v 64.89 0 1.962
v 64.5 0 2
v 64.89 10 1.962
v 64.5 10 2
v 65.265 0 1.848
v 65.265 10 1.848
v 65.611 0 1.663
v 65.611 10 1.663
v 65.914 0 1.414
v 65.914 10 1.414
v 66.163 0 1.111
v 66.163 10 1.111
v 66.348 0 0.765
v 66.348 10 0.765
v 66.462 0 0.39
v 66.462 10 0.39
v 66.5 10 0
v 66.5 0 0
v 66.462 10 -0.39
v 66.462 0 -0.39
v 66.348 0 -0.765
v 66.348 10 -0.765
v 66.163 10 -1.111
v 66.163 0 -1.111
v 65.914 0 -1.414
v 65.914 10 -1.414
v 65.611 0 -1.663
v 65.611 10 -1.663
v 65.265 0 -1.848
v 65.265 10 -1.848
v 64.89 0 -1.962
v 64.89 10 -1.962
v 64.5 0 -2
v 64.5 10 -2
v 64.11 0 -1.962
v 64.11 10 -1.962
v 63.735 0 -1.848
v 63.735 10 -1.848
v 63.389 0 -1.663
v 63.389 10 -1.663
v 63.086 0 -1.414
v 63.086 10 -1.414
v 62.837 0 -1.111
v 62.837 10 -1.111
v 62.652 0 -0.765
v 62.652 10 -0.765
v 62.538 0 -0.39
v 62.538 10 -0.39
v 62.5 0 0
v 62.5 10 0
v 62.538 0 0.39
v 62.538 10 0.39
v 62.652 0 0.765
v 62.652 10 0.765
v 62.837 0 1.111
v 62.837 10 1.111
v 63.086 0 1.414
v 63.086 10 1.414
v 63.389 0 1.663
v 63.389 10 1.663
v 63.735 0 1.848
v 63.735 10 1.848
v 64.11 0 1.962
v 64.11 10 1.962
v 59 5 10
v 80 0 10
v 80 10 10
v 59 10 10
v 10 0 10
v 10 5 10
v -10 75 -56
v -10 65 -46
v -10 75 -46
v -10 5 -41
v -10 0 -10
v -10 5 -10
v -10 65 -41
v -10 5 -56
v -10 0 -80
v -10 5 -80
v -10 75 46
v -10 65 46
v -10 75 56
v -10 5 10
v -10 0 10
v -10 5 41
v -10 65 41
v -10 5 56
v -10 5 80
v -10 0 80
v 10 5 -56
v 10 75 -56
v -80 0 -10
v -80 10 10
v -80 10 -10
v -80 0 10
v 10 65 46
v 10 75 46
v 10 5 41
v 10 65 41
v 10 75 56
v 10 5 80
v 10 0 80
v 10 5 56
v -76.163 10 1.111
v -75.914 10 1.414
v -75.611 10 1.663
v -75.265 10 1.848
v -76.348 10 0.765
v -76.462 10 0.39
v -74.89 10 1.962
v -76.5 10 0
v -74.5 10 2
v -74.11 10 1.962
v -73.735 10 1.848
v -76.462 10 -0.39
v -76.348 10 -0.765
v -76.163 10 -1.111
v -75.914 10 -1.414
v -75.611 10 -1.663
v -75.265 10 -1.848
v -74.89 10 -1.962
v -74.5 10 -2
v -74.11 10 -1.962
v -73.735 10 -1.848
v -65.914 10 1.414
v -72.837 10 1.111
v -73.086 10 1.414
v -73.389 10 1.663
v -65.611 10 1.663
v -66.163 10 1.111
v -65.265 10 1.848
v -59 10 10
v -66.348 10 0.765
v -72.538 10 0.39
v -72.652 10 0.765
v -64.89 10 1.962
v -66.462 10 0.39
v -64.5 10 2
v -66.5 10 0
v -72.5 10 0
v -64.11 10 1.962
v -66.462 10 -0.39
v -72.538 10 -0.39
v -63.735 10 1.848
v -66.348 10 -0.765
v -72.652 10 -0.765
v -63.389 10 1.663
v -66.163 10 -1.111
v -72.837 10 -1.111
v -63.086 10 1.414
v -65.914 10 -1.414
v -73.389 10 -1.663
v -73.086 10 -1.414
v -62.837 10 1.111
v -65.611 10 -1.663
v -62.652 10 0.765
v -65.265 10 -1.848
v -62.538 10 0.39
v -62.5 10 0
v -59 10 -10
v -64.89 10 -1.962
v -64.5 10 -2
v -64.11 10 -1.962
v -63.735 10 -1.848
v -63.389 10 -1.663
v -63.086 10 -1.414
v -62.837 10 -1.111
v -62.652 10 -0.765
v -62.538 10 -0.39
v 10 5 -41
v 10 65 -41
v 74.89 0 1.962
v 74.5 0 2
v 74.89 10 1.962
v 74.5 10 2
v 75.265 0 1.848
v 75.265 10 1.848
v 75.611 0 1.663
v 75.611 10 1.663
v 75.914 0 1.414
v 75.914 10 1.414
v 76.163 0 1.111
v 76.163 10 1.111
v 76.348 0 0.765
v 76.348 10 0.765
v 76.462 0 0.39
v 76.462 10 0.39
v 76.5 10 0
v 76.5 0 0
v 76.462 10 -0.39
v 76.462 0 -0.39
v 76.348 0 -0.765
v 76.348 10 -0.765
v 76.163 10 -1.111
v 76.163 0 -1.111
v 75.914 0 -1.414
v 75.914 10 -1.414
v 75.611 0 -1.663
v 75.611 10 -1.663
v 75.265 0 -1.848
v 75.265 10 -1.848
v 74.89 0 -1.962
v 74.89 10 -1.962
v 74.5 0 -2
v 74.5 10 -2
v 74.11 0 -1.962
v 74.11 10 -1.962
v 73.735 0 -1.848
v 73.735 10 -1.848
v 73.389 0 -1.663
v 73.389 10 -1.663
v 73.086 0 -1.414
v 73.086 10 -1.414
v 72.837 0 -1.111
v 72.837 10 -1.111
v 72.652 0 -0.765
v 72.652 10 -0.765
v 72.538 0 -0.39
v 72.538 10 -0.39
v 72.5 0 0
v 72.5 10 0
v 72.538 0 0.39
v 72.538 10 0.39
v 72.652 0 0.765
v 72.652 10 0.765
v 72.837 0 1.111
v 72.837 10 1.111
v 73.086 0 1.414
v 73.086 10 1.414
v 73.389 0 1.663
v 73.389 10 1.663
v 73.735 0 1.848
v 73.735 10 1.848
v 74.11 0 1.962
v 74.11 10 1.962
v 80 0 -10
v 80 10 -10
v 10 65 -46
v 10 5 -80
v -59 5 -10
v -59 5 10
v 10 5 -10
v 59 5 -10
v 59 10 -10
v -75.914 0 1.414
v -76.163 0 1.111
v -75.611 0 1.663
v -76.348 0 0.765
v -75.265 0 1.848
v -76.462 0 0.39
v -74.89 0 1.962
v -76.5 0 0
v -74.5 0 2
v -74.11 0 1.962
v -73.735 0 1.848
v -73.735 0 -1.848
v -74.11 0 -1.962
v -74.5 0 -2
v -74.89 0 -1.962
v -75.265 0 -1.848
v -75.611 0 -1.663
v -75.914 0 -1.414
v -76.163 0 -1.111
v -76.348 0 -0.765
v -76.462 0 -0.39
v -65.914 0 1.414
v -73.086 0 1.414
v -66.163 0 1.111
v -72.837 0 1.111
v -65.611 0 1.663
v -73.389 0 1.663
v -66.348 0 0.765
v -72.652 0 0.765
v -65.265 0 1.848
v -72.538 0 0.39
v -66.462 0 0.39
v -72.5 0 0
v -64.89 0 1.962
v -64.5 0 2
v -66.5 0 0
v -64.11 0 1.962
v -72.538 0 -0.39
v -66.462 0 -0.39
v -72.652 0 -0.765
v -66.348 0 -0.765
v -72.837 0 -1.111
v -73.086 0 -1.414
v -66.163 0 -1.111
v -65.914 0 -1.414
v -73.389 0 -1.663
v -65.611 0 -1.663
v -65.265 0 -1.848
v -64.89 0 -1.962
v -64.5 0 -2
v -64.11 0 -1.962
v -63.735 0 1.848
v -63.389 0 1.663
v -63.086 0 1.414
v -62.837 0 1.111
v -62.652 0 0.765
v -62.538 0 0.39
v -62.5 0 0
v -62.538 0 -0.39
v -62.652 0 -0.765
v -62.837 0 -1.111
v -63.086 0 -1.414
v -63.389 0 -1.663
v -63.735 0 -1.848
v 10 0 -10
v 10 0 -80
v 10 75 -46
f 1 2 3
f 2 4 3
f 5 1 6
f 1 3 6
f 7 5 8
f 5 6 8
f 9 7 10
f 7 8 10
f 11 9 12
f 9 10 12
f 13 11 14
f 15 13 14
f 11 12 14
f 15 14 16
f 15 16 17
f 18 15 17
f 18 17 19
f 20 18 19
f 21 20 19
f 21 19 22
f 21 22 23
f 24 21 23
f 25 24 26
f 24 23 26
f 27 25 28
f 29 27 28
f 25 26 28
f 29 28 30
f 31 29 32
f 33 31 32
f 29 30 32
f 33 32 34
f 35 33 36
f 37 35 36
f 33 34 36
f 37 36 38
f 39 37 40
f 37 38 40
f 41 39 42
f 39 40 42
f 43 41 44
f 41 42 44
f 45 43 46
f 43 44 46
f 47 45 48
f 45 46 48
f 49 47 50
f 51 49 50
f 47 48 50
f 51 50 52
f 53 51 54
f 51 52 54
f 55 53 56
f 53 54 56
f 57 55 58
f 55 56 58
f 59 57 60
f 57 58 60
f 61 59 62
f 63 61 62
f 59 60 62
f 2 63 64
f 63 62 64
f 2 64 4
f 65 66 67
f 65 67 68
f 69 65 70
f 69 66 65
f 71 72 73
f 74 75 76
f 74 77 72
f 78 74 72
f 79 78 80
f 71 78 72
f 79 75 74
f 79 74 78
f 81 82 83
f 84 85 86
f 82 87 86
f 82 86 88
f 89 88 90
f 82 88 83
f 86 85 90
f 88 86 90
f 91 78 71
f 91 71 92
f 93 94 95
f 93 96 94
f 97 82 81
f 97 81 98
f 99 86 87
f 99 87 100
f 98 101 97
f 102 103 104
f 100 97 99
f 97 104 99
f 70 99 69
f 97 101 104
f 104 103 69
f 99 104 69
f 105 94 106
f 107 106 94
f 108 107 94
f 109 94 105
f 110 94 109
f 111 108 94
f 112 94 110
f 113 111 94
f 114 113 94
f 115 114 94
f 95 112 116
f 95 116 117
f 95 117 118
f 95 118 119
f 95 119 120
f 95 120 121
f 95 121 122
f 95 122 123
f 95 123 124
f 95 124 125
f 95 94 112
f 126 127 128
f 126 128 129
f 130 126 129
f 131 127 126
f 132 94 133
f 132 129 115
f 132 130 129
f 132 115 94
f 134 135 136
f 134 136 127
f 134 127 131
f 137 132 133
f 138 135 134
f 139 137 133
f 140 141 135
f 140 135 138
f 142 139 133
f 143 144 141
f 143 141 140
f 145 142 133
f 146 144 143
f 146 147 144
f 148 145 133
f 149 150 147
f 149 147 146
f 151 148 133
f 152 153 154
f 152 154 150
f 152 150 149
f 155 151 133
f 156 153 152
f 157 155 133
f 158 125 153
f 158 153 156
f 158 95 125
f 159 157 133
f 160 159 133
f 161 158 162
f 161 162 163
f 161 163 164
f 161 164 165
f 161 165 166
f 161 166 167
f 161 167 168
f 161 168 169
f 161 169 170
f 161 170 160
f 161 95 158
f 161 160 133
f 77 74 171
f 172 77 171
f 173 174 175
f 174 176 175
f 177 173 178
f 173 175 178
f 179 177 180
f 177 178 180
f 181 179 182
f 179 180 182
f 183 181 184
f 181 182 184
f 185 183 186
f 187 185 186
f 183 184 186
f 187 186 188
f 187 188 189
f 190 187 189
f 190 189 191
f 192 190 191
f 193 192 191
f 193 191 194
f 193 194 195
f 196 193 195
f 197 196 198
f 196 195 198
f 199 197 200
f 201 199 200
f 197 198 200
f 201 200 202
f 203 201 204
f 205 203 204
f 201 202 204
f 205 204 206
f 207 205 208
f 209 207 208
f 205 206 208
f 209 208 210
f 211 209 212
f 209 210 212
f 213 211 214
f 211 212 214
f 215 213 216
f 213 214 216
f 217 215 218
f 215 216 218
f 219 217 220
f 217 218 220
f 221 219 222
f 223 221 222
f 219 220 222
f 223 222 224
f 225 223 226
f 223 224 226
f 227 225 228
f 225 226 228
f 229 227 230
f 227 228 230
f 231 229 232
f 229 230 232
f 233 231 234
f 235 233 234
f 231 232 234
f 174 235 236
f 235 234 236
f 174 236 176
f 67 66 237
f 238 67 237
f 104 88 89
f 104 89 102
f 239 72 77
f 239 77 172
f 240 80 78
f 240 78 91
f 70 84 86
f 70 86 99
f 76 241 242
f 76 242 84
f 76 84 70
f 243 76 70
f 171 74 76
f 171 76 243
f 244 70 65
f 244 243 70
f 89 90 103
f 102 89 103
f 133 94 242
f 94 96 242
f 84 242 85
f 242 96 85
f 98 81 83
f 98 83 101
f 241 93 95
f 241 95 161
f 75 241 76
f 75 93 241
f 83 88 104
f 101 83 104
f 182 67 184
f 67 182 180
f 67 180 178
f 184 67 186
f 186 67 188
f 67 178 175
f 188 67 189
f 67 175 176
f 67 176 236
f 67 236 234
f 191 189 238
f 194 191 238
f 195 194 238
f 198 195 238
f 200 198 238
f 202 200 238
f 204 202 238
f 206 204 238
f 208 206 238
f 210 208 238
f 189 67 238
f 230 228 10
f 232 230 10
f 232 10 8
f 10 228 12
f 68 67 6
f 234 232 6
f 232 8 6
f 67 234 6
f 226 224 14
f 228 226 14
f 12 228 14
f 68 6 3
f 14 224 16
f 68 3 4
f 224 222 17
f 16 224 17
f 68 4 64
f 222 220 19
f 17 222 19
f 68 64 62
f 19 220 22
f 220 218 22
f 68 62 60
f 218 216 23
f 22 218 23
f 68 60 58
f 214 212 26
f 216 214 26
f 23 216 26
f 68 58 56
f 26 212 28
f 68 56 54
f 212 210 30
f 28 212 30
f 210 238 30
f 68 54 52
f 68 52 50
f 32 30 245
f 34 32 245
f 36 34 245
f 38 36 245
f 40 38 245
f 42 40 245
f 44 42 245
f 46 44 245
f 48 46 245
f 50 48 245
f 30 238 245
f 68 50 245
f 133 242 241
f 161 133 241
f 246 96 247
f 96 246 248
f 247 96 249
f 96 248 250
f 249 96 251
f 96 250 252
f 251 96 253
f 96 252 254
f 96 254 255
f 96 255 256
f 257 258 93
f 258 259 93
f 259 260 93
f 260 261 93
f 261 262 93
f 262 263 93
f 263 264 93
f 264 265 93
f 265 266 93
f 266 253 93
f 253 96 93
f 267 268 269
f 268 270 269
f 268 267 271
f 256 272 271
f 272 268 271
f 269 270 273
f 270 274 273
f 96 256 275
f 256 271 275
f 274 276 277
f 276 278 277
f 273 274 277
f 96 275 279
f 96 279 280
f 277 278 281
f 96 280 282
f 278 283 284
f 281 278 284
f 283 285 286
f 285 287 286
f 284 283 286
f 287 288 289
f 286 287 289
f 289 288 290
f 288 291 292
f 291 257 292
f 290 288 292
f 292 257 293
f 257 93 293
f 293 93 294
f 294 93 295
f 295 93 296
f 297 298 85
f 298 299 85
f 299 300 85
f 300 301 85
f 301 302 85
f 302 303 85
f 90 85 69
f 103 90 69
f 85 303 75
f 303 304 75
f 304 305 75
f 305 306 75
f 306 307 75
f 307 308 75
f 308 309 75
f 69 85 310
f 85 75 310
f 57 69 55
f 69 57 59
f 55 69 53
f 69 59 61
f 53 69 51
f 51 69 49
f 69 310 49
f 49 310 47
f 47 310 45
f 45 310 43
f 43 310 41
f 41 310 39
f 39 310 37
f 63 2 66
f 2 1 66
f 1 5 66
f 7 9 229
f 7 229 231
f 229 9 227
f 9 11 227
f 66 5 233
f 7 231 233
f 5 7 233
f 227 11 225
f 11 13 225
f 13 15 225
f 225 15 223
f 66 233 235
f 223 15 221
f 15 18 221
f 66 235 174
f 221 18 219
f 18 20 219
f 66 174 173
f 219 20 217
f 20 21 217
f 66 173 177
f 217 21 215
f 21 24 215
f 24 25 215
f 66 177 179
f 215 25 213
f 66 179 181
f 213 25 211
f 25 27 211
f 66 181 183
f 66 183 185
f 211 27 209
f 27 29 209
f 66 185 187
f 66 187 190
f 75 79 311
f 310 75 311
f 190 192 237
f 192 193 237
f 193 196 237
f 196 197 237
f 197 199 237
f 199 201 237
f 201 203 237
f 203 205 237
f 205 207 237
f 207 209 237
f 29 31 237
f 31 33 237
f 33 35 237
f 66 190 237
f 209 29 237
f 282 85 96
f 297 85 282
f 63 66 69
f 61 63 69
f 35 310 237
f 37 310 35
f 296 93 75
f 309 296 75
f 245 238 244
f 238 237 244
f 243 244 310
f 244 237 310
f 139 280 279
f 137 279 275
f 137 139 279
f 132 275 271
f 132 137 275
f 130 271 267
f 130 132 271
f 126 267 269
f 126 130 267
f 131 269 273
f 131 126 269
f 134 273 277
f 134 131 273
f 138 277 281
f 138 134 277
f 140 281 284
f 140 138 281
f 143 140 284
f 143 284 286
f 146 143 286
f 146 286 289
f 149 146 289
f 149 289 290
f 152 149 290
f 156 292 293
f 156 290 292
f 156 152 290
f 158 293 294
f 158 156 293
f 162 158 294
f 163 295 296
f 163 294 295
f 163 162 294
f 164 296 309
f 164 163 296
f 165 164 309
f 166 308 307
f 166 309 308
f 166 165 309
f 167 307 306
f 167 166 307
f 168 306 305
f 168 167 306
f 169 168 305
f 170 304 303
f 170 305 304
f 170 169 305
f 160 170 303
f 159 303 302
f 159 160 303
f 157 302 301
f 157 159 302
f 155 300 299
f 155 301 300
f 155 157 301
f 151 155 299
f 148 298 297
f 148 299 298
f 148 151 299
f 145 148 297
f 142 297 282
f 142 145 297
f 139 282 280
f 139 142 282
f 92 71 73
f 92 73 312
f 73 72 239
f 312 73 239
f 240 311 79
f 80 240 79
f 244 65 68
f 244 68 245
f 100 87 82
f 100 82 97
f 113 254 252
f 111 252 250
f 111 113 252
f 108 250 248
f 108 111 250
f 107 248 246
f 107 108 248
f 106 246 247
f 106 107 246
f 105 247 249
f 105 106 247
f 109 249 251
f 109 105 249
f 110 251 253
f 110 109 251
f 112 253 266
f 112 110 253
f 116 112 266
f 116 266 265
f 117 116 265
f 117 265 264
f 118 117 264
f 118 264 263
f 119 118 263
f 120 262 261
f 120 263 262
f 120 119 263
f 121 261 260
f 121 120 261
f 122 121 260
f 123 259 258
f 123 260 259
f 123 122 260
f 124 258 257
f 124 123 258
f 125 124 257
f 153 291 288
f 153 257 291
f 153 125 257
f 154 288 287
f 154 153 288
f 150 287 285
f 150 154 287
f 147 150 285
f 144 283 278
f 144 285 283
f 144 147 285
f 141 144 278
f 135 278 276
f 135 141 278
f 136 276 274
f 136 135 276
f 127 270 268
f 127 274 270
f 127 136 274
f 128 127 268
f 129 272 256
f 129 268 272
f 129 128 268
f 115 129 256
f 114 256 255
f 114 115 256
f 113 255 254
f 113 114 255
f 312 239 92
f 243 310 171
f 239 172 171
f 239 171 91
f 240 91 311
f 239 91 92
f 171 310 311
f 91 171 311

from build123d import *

# Parameters (mm, degrees)
BOSS_EXTRUDE1_DEPTH            = 5
SKETCH3_W                      = 21
SKETCH3_H                      = 20
BOSS_EXTRUDE2_DEPTH            = 5
F_4_0MM_DOWEL_HOLE1_AT_2_COUNT = 2
F_4_0MM_DOWEL_HOLE1_AT_2_PITCH = 10
SKETCH15_W                     = 20
SKETCH15_H                     = 15
BOSS_EXTRUDE6_DEPTH            = 60
SKETCH16_W                     = 20
SKETCH16_H                     = 10
BOSS_EXTRUDE7_DEPTH            = 10


with BuildPart() as part:
    # Sketch2 → Boss-Extrude1 (new body)
    with BuildSketch(Plane(origin=(0, 0, 0), x_dir=(1, 0, 0), z_dir=(0, 1, 0))):
        Polygon((-80, -10), (-10, -10), (-10, -80), (10, -80), (10, -10), (80, -10), (80, 10), (10, 10), (10, 80), (-10, 80), (-10, 10), (-80, 10), align=None)
    extrude(amount=BOSS_EXTRUDE1_DEPTH)

    # Sketch3 → Boss-Extrude2 (add)
    with BuildSketch(Plane(origin=(0, 5, 0), x_dir=(1, 0, 0), z_dir=(0, 1, 0))):
        with Locations((-69.5, 0)):
            Rectangle(SKETCH3_W, SKETCH3_H)
    boss_extrude2 = extrude(amount=BOSS_EXTRUDE2_DEPTH)

    # Sketch5 → Ø4.0mm Dowel Hole1 (revolve, cut)
    with BuildSketch(Plane(origin=(-64.5, 10, 0), x_dir=(0, 0, 1), z_dir=(1, 0, 0))):
        Polygon((0, 0), (0, 118.830821238), (2, 117.6291), (2, 0), align=None)
    f_4_0mm_dowel_hole1 = revolve(axis=Axis((-64.5, 16.35, 0), (0, -1, 0)), mode=Mode.SUBTRACT)

    # Ø4.0mm Dowel Hole1 at 2: Ø4.0mm Dowel Hole1 ×2
    with Locations(*[(-i * F_4_0MM_DOWEL_HOLE1_AT_2_PITCH, 0, 0) for i in range(1, F_4_0MM_DOWEL_HOLE1_AT_2_COUNT)]):
        add(f_4_0mm_dowel_hole1, mode=Mode.SUBTRACT)

    # Mirror1: Boss-Extrude2, Ø4.0mm Dowel Hole1 across plane
    add(boss_extrude2.mirror(Plane(origin=(0, 0, 0), x_dir=(0, 0, 1), z_dir=(1, 0, 0))))
    add(f_4_0mm_dowel_hole1.mirror(Plane(origin=(0, 0, 0), x_dir=(0, 0, 1), z_dir=(1, 0, 0))), mode=Mode.SUBTRACT)

    # Mirror1 copy 1 sketch → Mirror1 copy 1 (revolve, cut)
    with BuildSketch(Plane(origin=(74.5, 10, 0), x_dir=(0, 0, 1), z_dir=(-1, 0, 0))):
        Polygon((0, 0), (0, -118.830821238), (2, -117.6291), (2, 0), align=None)
    revolve(axis=Axis((74.5, 16.35, 0), (0, 1, 0)), mode=Mode.SUBTRACT)

    # Sketch15 → Boss-Extrude6 (add)
    with BuildSketch(Plane(origin=(0, 5, 0), x_dir=(1, 0, 0), z_dir=(0, 1, 0))):
        with Locations((0, 48.5)):
            Rectangle(SKETCH15_W, SKETCH15_H)
        with Locations((0, -48.5)):
            Rectangle(SKETCH15_W, SKETCH15_H)
    extrude(amount=BOSS_EXTRUDE6_DEPTH)

    # Sketch16 → Boss-Extrude7 (add)
    with BuildSketch(Plane(origin=(0, 65, 0), x_dir=(1, 0, 0), z_dir=(0, 1, 0))):
        with Locations((0, 51)):
            Rectangle(SKETCH16_W, SKETCH16_H)
        with Locations((0, -51)):
            Rectangle(SKETCH16_W, SKETCH16_H)
    extrude(amount=BOSS_EXTRUDE7_DEPTH)


solid = part.part
